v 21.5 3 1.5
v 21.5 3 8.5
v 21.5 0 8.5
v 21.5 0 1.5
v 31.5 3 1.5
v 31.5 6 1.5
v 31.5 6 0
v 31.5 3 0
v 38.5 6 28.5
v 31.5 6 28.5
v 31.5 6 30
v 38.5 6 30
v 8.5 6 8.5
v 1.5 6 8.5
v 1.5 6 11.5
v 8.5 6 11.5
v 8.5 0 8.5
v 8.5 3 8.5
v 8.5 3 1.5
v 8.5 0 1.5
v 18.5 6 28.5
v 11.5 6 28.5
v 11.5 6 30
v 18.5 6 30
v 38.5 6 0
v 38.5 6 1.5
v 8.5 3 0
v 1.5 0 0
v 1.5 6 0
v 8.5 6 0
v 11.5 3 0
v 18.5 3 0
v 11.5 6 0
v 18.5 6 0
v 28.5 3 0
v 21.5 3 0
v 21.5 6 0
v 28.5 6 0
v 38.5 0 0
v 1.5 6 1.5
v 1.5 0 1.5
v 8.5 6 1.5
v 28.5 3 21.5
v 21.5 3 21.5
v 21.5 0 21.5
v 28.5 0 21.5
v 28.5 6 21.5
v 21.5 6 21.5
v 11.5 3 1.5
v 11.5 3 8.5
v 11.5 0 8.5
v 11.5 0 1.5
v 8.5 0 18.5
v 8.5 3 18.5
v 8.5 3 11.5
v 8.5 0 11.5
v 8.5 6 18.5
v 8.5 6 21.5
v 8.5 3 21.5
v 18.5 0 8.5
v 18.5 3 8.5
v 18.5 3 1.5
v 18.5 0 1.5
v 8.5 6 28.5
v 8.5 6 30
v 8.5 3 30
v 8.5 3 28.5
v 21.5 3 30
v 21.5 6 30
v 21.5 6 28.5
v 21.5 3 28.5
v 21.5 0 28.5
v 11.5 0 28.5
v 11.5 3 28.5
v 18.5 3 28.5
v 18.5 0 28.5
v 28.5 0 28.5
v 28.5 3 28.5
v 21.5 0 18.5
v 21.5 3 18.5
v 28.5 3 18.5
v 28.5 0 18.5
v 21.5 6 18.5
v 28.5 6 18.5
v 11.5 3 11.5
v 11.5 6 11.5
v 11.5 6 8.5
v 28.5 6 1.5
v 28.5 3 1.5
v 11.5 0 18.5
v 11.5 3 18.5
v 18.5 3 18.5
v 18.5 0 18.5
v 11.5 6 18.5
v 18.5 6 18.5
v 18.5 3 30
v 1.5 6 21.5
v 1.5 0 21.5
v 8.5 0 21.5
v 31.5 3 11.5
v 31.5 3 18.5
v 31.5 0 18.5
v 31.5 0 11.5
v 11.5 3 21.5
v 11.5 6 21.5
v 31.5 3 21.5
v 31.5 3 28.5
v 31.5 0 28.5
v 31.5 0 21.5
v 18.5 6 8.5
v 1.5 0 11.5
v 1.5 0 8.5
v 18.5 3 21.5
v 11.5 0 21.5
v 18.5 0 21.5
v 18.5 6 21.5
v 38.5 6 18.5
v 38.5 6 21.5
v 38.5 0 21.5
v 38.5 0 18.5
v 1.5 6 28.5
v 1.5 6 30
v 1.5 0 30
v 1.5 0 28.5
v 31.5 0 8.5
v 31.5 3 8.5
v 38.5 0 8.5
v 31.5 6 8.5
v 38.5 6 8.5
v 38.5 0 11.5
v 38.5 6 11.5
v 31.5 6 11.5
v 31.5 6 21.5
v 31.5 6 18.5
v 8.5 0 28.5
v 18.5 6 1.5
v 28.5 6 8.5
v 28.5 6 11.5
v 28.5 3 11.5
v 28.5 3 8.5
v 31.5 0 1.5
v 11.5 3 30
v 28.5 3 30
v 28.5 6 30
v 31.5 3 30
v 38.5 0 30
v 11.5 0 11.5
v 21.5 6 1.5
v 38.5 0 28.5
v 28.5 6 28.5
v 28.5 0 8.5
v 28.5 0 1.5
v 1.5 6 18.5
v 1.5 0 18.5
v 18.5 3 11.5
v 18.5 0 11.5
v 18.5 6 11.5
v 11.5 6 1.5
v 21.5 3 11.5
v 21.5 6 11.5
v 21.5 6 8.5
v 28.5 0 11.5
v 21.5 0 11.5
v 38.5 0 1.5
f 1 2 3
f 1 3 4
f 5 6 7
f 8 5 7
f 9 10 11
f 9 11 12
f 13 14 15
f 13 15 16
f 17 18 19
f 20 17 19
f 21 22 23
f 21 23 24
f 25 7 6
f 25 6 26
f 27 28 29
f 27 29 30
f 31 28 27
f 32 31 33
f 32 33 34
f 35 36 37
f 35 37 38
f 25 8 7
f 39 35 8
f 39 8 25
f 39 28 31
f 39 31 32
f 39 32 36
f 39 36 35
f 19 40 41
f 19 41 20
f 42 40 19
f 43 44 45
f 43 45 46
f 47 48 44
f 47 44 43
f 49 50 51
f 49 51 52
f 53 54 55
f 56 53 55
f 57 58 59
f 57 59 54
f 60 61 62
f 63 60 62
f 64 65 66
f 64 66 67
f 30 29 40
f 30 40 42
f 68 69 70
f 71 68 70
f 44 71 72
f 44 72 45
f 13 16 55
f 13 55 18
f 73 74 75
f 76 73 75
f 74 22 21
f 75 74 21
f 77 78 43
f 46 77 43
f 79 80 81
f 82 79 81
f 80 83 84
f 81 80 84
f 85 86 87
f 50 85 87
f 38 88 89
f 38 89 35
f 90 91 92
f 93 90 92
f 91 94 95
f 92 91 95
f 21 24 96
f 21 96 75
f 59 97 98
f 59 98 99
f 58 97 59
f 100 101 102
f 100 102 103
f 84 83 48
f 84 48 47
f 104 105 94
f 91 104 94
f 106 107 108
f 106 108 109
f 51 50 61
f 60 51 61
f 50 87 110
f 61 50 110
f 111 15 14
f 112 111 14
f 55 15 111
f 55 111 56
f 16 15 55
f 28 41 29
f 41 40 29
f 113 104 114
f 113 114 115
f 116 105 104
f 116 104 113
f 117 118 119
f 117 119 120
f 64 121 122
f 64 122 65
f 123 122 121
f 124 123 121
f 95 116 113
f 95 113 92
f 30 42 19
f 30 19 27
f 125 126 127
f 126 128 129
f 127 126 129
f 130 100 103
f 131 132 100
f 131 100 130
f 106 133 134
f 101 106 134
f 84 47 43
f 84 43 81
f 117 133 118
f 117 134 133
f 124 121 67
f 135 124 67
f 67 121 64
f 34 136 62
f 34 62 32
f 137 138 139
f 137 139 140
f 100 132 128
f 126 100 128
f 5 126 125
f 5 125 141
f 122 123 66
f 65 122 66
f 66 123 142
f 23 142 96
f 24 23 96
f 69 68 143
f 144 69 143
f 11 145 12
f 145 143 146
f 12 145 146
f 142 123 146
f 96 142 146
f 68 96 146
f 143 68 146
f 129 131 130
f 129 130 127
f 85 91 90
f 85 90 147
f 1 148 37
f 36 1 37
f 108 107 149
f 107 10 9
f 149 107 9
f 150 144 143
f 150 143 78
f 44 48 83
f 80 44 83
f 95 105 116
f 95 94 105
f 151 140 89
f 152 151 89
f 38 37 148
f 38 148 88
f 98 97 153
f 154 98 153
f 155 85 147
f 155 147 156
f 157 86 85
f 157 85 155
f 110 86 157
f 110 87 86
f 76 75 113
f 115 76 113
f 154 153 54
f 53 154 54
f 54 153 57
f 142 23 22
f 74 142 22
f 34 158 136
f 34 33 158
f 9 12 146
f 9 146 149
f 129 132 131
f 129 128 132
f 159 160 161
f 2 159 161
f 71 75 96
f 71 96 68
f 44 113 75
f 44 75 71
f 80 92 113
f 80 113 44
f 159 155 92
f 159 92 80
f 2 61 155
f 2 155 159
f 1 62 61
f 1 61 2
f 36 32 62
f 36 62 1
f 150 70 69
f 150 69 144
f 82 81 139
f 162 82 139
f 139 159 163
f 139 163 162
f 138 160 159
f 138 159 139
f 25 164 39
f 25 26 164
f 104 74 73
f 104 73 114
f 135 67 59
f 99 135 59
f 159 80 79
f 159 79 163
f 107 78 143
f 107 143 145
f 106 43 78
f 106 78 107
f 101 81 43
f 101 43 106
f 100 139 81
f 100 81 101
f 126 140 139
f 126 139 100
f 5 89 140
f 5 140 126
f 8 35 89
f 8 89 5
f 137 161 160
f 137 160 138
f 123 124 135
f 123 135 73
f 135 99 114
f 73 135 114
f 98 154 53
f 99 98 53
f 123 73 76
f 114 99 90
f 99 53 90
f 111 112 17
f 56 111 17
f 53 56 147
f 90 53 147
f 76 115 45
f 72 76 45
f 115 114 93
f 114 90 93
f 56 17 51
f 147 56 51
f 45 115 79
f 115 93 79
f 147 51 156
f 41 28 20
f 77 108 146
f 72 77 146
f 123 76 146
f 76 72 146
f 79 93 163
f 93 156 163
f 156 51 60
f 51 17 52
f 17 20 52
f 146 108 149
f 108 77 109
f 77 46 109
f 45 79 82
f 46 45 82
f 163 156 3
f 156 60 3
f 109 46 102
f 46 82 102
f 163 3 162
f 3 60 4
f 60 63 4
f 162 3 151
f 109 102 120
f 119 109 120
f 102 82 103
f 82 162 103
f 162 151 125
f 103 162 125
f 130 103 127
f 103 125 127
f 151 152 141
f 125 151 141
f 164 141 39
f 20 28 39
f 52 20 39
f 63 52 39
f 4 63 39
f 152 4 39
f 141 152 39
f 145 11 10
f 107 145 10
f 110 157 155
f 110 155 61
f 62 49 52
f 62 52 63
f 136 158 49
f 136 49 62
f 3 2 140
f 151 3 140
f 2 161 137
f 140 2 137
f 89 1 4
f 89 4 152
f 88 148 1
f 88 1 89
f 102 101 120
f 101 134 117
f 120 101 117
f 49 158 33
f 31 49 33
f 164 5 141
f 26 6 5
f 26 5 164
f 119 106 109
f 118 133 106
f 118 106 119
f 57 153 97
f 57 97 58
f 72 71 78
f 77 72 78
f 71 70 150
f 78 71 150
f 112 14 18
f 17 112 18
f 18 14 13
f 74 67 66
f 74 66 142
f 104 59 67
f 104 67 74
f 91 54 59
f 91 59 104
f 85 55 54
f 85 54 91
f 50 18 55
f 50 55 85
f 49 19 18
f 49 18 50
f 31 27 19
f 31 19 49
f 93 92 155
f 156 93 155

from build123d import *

# Parameters (mm, degrees)
SKETCH6_W            = 40
SKETCH6_H            = 30
BOSS_EXTRUDE1_DEPTH  = 6
SKETCH10_W           = 7
SKETCH10_H           = 7
CUT_EXTRUDE6_DEPTH   = 51.358713248
LPATTERN3_COUNT      = 3
LPATTERN3_PITCH      = 10
LPATTERN3_COUNT_DIR2 = 4
LPATTERN3_PITCH_DIR2 = 10
SKETCH11_W           = 3
SKETCH11_H           = 30
CUT_EXTRUDE7_DEPTH   = 3
LPATTERN4_COUNT      = 3
LPATTERN4_PITCH      = 10
SKETCH12_W           = 1.5
SKETCH12_H           = 30
CUT_EXTRUDE8_DEPTH   = 51.358713248


with BuildPart() as part:
    # Sketch6 → Boss-Extrude1 (new body)
    with BuildSketch(Plane(origin=(0, 0, 0), x_dir=(1, 0, 0), z_dir=(0, 1, 0))):
        with Locations((20, -15)):
            Rectangle(SKETCH6_W, SKETCH6_H)
    extrude(amount=BOSS_EXTRUDE1_DEPTH)

    # Sketch10 → Cut-Extrude6 (cut, through all)
    with BuildSketch(Plane(origin=(0, 6, 0), x_dir=(1, 0, 0), z_dir=(0, 1, 0))):
        with Locations((5, -5)):
            Rectangle(SKETCH10_W, SKETCH10_H)
    cut_extrude6 = extrude(amount=-CUT_EXTRUDE6_DEPTH, mode=Mode.SUBTRACT)

    # LPattern3: Cut-Extrude6 3 × 4
    with Locations(*[(j * LPATTERN3_PITCH_DIR2, 0, i * LPATTERN3_PITCH) for i in range(LPATTERN3_COUNT) for j in range(LPATTERN3_COUNT_DIR2) if (i, j) != (0, 0)]):
        add(cut_extrude6, mode=Mode.SUBTRACT)

    # Sketch11 → Cut-Extrude7 (cut)
    with BuildSketch(Plane(origin=(0, 6, 0), x_dir=(1, 0, 0), z_dir=(0, 1, 0))):
        with Locations((10, -15)):
            Rectangle(SKETCH11_W, SKETCH11_H)
    cut_extrude7 = extrude(amount=-CUT_EXTRUDE7_DEPTH, mode=Mode.SUBTRACT)

    # LPattern4: Cut-Extrude7 ×3
    with Locations(*[(i * LPATTERN4_PITCH, 0, 0) for i in range(1, LPATTERN4_COUNT)]):
        add(cut_extrude7, mode=Mode.SUBTRACT)

    # Sketch12 → Cut-Extrude8 (cut, through all)
    with BuildSketch(Plane(origin=(0, 6, 0), x_dir=(1, 0, 0), z_dir=(0, 1, 0))):
        with Locations((0.75, -15)):
            Rectangle(SKETCH12_W, SKETCH12_H)
        with Locations((39.25, -15)):
            Rectangle(SKETCH12_W, SKETCH12_H)
    extrude(amount=-CUT_EXTRUDE8_DEPTH, mode=Mode.SUBTRACT)


solid = part.part
